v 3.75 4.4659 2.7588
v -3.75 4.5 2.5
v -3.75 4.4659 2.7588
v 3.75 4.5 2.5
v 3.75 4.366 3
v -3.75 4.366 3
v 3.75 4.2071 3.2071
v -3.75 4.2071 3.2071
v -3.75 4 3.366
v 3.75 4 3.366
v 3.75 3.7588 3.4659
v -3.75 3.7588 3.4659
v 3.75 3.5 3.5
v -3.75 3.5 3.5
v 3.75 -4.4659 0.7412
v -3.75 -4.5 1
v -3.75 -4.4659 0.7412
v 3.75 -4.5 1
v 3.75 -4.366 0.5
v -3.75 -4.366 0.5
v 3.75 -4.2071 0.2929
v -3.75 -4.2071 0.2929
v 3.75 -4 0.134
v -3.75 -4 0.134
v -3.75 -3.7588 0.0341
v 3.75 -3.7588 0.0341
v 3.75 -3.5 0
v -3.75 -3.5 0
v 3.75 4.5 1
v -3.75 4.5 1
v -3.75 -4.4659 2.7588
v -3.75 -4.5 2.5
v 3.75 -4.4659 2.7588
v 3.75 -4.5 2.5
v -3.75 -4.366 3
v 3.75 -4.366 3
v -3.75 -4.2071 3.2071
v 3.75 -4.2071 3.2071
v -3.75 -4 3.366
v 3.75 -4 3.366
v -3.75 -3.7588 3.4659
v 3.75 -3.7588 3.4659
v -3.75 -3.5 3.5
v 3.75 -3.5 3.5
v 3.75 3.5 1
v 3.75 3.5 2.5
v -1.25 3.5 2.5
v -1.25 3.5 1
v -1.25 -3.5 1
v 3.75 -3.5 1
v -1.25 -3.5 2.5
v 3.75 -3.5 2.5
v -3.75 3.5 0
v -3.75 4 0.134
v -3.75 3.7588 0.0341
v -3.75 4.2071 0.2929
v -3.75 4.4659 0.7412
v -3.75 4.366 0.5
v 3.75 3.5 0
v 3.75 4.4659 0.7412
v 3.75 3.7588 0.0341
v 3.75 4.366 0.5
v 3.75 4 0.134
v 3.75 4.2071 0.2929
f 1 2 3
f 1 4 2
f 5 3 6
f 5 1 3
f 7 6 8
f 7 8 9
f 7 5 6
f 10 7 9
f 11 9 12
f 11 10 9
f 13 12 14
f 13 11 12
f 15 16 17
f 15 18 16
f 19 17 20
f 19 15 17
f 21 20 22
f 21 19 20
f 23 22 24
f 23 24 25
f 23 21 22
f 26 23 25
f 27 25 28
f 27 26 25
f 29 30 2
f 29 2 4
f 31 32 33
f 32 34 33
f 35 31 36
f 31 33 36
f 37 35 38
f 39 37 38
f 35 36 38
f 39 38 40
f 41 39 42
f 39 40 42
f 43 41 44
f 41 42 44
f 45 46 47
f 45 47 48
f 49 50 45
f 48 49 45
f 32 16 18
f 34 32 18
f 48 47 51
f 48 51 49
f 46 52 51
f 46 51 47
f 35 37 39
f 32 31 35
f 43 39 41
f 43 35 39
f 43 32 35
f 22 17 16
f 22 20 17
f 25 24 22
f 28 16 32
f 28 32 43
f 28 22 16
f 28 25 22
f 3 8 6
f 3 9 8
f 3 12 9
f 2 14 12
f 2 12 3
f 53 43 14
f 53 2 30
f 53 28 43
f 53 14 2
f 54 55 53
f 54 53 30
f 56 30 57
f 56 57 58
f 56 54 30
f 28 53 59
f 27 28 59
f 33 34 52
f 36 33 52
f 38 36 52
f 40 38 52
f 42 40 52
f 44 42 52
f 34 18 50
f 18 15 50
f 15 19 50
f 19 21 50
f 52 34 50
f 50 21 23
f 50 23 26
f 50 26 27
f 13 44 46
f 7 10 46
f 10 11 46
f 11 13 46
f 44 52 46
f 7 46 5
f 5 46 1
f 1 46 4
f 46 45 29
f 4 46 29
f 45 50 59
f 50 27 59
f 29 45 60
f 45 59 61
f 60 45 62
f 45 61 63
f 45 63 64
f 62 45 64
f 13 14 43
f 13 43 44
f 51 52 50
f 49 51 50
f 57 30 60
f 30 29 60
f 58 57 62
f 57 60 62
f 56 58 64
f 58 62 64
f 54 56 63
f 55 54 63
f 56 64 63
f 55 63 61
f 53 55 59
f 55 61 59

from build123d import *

# Parameters (mm, degrees)
SKICA1_W                 = 7.5
SKICA1_H                 = 9
P_IDAT_VYSUNUT_M1_DEPTH  = 3.5
ZAOBLIT1_R               = 1
SKICA2_W                 = 1.5
SKICA2_H                 = 7
ODEBRAT_VYSUNUT_M1_DEPTH = 5


with BuildPart() as part:
    # Skica1 → Přidat vysunutím1 (new body)
    with BuildSketch(Plane.XY):
        Rectangle(SKICA1_W, SKICA1_H)
    extrude(amount=P_IDAT_VYSUNUT_M1_DEPTH)

    # Zaoblit1
    zaoblit1_edges = [part.edges().sort_by_distance(p)[0] for p in [
        (0, -4.5, 3.5),
        (0, -4.5, 0),
        (0, 4.5, 0),
        (0, 4.5, 3.5),
    ]]
    fillet(zaoblit1_edges, radius=ZAOBLIT1_R)

    # Skica2 → Odebrat vysunutím1 (cut)
    with BuildSketch(Plane(origin=(3.75, 0, 0), x_dir=(0, 0, -1), z_dir=(1, 0, 0))):
        with Locations((-1.75, 0)):
            Rectangle(SKICA2_W, SKICA2_H)
    extrude(amount=-ODEBRAT_VYSUNUT_M1_DEPTH, mode=Mode.SUBTRACT)


solid = part.part
